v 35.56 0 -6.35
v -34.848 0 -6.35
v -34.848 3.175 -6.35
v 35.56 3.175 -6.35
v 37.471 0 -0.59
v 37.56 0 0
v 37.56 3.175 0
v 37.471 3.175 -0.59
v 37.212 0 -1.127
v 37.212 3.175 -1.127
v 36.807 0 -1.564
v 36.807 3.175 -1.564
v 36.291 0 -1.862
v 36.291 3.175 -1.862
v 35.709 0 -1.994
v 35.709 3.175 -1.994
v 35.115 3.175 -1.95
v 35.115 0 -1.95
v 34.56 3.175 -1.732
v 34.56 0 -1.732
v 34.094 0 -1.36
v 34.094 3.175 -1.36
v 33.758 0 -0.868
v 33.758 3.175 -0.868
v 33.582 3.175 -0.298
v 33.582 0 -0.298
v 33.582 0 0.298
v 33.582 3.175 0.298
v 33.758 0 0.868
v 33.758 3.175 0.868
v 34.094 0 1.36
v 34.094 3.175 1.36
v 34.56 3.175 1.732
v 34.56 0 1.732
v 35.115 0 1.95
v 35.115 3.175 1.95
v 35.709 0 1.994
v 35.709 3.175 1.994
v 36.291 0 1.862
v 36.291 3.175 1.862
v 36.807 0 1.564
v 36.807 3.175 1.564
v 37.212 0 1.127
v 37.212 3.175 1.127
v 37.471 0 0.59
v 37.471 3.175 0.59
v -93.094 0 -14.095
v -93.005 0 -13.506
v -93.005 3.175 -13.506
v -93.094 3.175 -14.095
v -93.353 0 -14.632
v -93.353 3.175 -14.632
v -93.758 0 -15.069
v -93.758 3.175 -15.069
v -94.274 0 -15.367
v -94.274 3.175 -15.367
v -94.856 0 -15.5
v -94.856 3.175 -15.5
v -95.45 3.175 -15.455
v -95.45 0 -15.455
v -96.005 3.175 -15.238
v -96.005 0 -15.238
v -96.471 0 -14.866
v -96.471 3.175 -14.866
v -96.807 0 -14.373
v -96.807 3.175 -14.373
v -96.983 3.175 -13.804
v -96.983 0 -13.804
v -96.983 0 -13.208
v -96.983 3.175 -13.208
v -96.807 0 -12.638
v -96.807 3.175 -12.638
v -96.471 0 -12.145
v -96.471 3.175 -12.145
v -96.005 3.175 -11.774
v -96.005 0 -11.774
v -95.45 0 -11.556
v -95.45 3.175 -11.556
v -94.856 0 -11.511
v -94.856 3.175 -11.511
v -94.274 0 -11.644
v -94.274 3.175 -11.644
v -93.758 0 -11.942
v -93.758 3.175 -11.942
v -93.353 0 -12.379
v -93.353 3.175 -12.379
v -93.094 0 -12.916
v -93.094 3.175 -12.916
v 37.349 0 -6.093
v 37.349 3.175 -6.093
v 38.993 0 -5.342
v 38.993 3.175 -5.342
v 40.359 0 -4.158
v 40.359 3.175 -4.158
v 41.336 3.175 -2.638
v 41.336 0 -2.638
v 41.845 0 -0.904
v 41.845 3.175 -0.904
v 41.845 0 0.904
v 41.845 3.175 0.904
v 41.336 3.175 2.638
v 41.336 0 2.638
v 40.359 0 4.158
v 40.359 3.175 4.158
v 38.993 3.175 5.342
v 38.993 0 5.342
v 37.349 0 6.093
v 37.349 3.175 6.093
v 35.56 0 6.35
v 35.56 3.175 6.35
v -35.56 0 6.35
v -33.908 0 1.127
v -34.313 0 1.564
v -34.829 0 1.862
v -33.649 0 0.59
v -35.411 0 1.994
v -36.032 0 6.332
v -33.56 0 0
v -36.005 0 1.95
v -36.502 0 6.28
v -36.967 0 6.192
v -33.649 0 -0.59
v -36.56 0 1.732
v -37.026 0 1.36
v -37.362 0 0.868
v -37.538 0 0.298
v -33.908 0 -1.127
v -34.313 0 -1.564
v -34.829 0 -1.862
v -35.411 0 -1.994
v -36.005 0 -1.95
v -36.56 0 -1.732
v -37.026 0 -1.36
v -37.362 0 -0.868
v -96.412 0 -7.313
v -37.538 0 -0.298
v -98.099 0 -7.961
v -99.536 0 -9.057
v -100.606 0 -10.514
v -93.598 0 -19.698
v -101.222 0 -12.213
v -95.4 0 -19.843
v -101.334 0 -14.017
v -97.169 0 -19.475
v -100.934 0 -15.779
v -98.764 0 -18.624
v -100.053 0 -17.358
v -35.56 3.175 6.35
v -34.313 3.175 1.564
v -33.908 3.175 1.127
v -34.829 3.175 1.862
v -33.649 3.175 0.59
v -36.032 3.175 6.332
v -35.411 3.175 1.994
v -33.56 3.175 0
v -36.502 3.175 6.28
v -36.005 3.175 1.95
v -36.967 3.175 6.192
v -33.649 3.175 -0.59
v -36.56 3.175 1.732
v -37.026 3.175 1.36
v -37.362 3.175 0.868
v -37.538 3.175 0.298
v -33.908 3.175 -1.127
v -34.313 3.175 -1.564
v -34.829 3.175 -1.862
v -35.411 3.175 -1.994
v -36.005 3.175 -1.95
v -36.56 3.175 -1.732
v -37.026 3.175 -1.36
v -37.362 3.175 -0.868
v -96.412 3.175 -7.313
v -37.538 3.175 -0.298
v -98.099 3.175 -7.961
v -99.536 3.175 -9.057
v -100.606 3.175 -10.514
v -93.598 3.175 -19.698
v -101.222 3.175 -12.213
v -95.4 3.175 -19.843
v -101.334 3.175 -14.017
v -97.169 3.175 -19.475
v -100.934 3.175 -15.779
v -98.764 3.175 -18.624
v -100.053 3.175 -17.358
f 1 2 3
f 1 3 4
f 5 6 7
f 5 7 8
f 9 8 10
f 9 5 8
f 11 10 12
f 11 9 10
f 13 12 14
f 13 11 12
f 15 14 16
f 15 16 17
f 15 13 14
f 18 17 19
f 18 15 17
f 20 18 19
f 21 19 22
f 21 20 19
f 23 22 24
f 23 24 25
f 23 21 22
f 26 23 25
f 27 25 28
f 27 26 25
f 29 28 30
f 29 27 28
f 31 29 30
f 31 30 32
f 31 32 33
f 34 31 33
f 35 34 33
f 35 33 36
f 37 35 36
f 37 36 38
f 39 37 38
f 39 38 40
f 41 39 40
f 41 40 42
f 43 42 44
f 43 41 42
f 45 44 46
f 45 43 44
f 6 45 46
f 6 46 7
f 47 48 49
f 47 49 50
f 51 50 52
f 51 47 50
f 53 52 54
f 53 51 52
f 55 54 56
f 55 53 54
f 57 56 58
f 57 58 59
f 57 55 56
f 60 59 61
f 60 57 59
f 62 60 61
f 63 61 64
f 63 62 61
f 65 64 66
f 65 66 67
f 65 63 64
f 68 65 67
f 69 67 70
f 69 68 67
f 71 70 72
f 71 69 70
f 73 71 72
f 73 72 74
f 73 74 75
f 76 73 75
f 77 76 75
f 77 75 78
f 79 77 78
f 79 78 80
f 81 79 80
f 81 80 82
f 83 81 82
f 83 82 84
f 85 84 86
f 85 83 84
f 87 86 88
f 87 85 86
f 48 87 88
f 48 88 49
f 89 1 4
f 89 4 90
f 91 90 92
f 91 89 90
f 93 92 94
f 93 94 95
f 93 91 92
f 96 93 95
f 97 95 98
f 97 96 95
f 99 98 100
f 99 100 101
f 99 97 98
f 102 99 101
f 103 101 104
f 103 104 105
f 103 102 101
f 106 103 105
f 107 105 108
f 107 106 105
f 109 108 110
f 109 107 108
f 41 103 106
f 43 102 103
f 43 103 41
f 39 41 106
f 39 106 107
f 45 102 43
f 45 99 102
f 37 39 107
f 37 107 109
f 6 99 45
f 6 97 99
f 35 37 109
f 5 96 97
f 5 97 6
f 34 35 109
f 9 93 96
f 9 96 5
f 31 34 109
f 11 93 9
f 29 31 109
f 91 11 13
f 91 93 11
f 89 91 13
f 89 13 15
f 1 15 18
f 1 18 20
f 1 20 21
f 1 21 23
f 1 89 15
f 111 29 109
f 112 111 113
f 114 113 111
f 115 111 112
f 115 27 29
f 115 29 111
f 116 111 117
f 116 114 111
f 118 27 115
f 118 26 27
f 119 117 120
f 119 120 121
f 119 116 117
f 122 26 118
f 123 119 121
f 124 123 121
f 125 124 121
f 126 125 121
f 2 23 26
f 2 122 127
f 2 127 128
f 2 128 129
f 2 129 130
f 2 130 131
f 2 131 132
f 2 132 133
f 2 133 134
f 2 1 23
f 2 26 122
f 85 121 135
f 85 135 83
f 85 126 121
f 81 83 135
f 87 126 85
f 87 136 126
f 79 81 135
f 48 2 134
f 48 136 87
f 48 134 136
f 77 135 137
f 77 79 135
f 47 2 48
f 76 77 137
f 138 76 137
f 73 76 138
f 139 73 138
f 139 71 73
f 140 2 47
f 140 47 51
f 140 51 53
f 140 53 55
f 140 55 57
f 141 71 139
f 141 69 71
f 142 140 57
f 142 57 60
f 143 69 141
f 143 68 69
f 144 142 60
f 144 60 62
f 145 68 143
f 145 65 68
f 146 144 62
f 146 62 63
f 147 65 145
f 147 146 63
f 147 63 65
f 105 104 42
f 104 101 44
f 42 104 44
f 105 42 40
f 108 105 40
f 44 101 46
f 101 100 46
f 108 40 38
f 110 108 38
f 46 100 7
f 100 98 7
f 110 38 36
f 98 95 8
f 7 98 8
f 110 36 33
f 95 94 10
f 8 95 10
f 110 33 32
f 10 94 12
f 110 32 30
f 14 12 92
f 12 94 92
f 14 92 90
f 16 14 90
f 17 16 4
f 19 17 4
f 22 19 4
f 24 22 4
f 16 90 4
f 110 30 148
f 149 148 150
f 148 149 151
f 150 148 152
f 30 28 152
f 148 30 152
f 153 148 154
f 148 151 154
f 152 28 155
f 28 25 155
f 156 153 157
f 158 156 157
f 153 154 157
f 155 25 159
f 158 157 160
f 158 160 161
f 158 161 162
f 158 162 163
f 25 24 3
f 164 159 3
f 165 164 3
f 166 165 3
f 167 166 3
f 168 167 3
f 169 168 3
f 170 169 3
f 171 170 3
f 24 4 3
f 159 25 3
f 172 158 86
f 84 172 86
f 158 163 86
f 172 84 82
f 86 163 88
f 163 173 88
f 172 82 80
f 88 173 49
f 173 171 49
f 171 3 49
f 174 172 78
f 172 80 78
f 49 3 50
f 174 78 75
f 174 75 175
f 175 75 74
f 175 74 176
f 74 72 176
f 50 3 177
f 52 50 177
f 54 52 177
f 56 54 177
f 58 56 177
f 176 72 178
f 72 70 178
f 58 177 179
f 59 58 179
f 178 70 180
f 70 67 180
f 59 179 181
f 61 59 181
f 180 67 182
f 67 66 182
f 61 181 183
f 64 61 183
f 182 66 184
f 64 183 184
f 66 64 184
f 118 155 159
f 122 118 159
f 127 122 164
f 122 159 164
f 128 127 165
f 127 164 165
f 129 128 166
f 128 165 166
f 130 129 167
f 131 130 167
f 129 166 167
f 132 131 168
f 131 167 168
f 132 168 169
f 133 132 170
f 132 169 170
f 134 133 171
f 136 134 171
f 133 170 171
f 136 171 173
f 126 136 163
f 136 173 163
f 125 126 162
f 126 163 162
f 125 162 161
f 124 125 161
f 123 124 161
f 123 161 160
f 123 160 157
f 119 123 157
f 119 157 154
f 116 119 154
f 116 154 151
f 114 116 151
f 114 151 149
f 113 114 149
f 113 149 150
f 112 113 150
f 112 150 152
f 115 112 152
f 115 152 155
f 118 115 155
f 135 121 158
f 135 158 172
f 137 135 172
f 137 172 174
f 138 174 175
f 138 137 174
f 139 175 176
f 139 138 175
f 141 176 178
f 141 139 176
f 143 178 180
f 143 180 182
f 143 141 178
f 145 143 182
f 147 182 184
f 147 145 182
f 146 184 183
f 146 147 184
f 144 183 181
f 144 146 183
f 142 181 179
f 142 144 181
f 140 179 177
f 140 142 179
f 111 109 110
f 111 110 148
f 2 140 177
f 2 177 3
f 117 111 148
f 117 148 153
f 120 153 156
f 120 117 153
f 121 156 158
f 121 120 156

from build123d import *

# Parameters (mm, degrees)
SKETCH2_R               = 2.000000064
BOSS_EXTRUDE2_DEPTH     = 3.175
SKETCH1_R               = 2.000000064
BOSS_EXTRUDE3_DEPTH     = 3.175
SKETCH3_R               = 2.000000064
CUT_EXTRUDE1_DEPTH      = 1
CUT_EXTRUDE1_DEPTH_BACK = 4.175


with BuildPart() as part:
    # Sketch2 → Boss-Extrude2 (new body)
    with BuildSketch(Plane(origin=(0, 0, 0), x_dir=(1, 0, 0), z_dir=(0, 1, 0))):
        with BuildLine():
            Line((-36.96683296, -6.1921984), (-96.411937598, 7.313398015))
            ThreePointArc((-96.411937598, 7.313398015), (-101.197303038, 14.912429375), (-93.598271679, 19.697794815))
            Line((-93.598271679, 19.697794815), (-34.15316704, 6.1921984))
            ThreePointArc((-34.15316704, 6.1921984), (-29.3678016, -1.40683296), (-36.96683296, -6.1921984))
        make_face()
        with Locations((-95.005104638, 13.505596415)):
            Circle(SKETCH2_R, mode=Mode.SUBTRACT)
    extrude(amount=BOSS_EXTRUDE2_DEPTH)

    # Sketch1 → Boss-Extrude3 (add)
    with BuildSketch(Plane(origin=(0, 0, 0), x_dir=(1, 0, 0), z_dir=(0, 1, 0))):
        with BuildLine():
            Line((-35.56, 6.35), (35.56, 6.35))
            ThreePointArc((35.56, 6.35), (41.91, 0), (35.56, -6.35))
            Line((35.56, -6.35), (-35.56, -6.35))
            ThreePointArc((-35.56, -6.35), (-41.91, 0), (-35.56, 6.35))
        make_face()
        with Locations((35.56, 0)):
            Circle(SKETCH1_R, mode=Mode.SUBTRACT)
    extrude(amount=BOSS_EXTRUDE3_DEPTH)

    # Sketch3 → Cut-Extrude1 (cut, two sides)
    with BuildSketch(Plane(origin=(0, 3.175, 0), x_dir=(1, 0, 0), z_dir=(0, 1, 0))) as cut_extrude1_sk:
        with Locations((-35.56, 0)):
            Circle(SKETCH3_R)
    extrude(amount=CUT_EXTRUDE1_DEPTH, mode=Mode.SUBTRACT)
    extrude(cut_extrude1_sk.sketch, amount=-CUT_EXTRUDE1_DEPTH_BACK, mode=Mode.SUBTRACT)


solid = part.part
